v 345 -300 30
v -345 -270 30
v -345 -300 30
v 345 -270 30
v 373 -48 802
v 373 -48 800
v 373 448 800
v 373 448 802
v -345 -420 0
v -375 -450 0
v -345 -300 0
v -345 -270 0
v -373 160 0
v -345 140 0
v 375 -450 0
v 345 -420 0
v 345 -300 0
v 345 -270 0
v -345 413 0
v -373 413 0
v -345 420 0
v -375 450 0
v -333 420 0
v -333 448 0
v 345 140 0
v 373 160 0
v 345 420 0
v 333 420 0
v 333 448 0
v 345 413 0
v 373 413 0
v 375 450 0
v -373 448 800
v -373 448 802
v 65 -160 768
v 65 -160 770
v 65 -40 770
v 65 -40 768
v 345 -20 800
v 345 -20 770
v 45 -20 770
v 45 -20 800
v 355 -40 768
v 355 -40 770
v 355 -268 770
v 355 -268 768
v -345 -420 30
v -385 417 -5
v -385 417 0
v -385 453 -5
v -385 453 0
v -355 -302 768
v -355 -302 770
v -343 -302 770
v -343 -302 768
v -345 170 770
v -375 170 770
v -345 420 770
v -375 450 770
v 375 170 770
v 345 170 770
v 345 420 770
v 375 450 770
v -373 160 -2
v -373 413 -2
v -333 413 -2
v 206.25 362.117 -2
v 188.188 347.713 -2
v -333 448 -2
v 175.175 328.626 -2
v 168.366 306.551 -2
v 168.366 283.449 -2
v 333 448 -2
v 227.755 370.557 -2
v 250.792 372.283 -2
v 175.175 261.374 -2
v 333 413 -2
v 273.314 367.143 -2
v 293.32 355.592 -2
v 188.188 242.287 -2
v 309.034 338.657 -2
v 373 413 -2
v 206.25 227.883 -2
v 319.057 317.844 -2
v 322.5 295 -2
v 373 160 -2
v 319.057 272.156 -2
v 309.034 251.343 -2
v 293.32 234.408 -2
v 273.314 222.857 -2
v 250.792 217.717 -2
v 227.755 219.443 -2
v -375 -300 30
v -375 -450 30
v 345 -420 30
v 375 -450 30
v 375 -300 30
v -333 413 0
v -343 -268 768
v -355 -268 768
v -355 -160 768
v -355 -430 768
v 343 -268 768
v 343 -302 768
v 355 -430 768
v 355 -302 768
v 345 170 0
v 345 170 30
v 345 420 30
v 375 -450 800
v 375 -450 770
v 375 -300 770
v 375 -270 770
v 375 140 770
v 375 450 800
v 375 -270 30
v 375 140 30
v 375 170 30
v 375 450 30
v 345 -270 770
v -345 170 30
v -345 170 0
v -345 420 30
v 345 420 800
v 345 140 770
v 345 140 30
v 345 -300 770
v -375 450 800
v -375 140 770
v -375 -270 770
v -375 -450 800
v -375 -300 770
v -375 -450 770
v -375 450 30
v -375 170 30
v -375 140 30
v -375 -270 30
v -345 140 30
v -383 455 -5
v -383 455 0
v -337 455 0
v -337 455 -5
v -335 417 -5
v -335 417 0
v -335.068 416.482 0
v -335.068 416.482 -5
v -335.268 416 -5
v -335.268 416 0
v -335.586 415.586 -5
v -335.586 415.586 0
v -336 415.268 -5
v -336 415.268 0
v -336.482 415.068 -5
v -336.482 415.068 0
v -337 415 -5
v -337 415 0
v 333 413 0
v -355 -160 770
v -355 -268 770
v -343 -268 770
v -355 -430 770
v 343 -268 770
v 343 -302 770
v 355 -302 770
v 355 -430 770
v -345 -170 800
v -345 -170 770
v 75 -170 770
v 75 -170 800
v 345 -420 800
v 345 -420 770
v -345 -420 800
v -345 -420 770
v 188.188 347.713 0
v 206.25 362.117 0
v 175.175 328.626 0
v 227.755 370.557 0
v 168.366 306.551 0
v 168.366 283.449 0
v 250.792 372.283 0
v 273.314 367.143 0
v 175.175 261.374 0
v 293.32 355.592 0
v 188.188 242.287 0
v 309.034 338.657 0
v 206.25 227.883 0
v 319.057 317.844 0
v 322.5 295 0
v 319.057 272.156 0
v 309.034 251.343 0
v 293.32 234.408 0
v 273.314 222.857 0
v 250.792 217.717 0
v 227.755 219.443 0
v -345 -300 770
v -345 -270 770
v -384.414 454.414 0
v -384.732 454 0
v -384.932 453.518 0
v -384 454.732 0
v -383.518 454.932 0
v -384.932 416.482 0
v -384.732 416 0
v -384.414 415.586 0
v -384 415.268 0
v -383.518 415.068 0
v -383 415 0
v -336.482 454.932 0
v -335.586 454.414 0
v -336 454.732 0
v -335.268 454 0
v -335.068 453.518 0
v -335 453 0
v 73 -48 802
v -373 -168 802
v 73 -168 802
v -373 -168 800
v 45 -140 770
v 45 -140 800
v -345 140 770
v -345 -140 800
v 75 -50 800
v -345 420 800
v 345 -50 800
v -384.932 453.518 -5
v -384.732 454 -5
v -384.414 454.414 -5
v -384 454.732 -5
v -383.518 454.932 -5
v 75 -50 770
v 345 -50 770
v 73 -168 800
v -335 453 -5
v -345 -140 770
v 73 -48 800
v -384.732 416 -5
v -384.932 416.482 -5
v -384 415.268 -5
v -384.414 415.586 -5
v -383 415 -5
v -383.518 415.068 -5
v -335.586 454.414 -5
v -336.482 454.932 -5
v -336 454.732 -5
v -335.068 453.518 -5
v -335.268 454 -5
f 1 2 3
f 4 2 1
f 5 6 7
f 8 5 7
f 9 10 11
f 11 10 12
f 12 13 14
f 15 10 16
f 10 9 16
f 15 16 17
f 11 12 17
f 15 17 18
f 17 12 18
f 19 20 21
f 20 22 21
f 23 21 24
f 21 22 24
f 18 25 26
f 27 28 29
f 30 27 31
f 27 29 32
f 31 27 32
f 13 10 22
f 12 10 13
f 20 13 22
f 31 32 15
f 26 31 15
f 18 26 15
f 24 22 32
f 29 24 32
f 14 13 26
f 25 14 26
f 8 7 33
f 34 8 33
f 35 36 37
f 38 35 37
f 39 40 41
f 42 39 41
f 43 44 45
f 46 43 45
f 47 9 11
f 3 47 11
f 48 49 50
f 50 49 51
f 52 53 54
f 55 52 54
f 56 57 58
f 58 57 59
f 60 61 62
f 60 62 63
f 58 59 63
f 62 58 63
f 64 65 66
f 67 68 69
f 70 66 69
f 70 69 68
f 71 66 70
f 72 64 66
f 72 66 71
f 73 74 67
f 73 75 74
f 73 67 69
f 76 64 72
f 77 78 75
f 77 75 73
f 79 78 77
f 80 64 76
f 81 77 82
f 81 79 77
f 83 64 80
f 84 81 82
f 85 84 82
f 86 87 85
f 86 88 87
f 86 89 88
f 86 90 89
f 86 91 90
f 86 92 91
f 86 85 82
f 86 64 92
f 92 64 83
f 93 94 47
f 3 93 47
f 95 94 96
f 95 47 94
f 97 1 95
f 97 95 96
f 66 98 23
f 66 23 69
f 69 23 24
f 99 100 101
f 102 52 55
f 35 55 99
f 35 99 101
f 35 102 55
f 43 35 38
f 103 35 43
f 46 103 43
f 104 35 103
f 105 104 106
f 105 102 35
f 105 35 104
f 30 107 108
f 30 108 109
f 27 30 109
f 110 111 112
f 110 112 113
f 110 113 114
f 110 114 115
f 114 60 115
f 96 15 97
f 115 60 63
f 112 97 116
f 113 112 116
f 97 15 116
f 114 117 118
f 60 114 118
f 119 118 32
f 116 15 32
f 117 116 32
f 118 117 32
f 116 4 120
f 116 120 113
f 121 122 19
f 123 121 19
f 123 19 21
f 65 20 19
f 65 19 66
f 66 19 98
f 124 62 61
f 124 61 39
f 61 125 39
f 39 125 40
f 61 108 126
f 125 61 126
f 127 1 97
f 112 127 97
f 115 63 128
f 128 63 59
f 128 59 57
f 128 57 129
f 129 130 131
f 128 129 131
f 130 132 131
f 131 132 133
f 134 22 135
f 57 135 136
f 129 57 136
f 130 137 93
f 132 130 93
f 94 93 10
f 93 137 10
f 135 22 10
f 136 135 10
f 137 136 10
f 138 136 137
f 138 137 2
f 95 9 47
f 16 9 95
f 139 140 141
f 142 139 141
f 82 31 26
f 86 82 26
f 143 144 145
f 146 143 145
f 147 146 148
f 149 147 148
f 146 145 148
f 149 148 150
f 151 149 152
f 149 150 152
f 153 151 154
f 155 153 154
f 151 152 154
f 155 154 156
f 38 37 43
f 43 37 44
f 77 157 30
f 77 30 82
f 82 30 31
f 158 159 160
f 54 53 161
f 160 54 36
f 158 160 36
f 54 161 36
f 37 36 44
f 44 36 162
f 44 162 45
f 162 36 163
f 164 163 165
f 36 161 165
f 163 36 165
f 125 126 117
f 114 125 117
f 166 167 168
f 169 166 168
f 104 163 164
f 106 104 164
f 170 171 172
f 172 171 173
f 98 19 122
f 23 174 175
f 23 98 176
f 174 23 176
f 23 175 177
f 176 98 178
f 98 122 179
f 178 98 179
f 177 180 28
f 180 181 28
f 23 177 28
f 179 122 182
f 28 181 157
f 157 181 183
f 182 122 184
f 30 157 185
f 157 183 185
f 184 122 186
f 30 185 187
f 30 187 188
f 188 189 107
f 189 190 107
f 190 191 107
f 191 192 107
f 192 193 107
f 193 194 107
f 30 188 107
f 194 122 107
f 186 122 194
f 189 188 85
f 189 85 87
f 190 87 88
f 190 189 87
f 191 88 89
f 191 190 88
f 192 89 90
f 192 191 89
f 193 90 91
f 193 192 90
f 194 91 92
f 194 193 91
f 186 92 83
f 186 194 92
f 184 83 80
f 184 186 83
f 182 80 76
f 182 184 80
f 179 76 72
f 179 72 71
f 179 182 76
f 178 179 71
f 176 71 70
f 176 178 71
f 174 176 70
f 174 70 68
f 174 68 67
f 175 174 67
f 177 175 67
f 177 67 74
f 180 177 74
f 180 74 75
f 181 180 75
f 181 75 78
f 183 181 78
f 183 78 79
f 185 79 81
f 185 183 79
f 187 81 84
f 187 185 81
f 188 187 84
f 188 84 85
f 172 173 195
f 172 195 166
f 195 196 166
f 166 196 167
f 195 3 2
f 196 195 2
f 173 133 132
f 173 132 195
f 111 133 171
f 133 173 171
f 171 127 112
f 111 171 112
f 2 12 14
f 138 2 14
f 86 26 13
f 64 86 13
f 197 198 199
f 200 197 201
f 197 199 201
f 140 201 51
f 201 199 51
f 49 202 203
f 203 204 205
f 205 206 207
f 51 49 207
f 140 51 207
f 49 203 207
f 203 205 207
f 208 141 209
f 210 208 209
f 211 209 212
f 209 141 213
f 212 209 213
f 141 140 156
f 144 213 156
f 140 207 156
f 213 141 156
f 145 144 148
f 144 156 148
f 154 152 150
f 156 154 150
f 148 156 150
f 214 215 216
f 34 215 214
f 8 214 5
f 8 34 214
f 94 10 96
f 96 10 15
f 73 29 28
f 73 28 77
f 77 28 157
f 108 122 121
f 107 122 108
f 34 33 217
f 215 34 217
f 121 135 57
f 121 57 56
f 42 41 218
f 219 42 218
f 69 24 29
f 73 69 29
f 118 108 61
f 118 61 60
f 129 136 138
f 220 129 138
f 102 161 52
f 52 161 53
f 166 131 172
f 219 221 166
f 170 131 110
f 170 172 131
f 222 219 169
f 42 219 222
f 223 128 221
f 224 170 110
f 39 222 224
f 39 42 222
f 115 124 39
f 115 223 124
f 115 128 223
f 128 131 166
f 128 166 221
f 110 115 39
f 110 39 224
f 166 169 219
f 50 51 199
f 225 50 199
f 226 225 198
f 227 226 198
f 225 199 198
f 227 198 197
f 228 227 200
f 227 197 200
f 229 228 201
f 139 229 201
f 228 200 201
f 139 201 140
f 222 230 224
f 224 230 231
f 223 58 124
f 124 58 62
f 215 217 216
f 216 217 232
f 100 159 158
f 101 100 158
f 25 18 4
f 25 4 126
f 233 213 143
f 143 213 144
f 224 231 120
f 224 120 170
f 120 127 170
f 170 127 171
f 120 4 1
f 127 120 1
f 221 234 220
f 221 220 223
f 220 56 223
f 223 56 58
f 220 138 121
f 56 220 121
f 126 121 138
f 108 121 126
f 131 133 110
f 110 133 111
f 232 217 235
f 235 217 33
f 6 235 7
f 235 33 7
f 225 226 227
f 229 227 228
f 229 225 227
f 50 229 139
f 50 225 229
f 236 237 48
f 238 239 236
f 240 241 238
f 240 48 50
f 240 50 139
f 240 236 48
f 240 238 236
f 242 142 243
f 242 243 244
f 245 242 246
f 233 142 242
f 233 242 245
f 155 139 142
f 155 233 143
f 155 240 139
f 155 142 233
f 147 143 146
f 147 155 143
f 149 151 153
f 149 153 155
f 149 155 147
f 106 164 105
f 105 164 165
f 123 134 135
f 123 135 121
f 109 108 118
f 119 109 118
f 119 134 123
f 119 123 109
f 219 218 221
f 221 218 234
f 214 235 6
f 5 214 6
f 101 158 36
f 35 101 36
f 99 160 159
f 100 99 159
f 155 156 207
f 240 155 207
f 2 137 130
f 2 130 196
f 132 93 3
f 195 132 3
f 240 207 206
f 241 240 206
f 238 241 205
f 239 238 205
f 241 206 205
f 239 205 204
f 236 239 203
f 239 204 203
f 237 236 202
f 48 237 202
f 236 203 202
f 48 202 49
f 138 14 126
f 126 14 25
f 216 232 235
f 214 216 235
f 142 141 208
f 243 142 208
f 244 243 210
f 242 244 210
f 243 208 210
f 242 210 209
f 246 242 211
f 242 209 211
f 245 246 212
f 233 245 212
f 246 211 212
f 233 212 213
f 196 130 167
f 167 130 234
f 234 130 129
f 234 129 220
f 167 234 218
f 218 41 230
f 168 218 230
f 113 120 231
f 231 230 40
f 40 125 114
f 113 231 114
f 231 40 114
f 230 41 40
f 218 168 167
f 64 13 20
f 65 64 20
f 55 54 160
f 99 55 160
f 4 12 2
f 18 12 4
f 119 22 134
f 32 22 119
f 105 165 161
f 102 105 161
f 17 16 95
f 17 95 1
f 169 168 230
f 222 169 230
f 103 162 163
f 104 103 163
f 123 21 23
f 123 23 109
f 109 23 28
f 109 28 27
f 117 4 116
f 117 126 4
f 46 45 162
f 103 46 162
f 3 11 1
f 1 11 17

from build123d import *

# Parameters (mm, degrees)
F0_W      = 750
F0_H      = 900
F0_W_2    = 690
F0_H_2    = 120
F0_H_3    = 410
F0_H_4    = 250
F1_DEPTH  = 30
F2_W      = 30
F2_H      = 30
F3_DEPTH  = 740
F5_DEPTH  = 5
F6_W      = 30
F6_H      = 30
F7_DEPTH  = 30
F9_DEPTH  = 2
F10_R     = 77.5
F11_DEPTH = 2
F13_DEPTH = 2


with BuildPart() as f1:
    # F0 (on Top) → F1 (new body)
    with BuildSketch(Plane.XY):
        Rectangle(F0_W, F0_H)
        with Locations((0, -360)):
            Rectangle(F0_W_2, F0_H_2, mode=Mode.SUBTRACT)
        with Locations((0, -65)):
            Rectangle(F0_W_2, F0_H_3, mode=Mode.SUBTRACT)
        with Locations((0, 295)):
            Rectangle(F0_W_2, F0_H_4, mode=Mode.SUBTRACT)
    extrude(amount=F1_DEPTH)

    # F2 (on face) → F3 (join)
    with BuildSketch(Plane.XY.offset(30)):
        with Locations((-360, -285)):
            Rectangle(F2_W, F2_H)
        with Locations((360, -285)):
            Rectangle(F2_W, F2_H)
        with Locations((360, 155)):
            Rectangle(F2_W, F2_H)
        with Locations((-360, 155)):
            Rectangle(F2_W, F2_H)
    extrude(amount=F3_DEPTH)

    # F6 (on face) → F7 (join)
    with BuildSketch(Plane.XY.offset(770)):
        Polygon((375, 170), (375, 450), (-375, 450), (-375, -450), (375, -450), (375, 140), (345, 140), (345, -20), (45, -20), (45, -140), (-345, -140), (-345, 420), (345, 420), (345, 170), align=None)
        Polygon((345, -50), (345, -420), (-345, -420), (-345, -170), (75, -170), (75, -50), align=None, mode=Mode.SUBTRACT)
        with Locations((360, 155)):
            Rectangle(F6_W, F6_H)
    extrude(amount=F7_DEPTH)

    # F10 (on face) → F11 (join)
    with BuildSketch(Plane(origin=(0, 0, 0), x_dir=(1, 0, 0), z_dir=(0, 0, -1))):
        Polygon((-373, -413), (-345, -413), (-345, -170), (345, -170), (345, -413), (373, -413), (373, -160), (0, -160), (-373, -160), align=None)
        Polygon((-333, -413), (-333, -420), (333, -420), (333, -413), (345, -413), (345, -170), (-345, -170), (-345, -413), align=None)
        with Locations((245, -295)):
            Circle(F10_R, mode=Mode.SUBTRACT)
        Polygon((-333, -448), (0, -448), (333, -448), (333, -420), (-333, -420), align=None)
    extrude(amount=F11_DEPTH)


with BuildPart() as f5:
    # F4 (on face) → F5 (new body)
    with BuildSketch(Plane(origin=(0, 0, 0), x_dir=(1, 0, 0), z_dir=(0, 0, -1))):
        Polygon((-345, -415), (-375, -415), (-375, -450), (-335, -450), (-335, -420), (-345, -420), align=None)
        with BuildLine():
            Line((-375, -415), (-383, -415))
            ThreePointArc((-383, -415), (-384.4142135624, -415.5857864376), (-385, -417))
            Line((-385, -417), (-385, -453))
            ThreePointArc((-385, -453), (-384.4142135624, -454.4142135624), (-383, -455))
            Line((-383, -455), (-337, -455))
            ThreePointArc((-337, -455), (-335.5857864376, -454.4142135624), (-335, -453))
            Line((-335, -453), (-335, -450))
            Line((-335, -450), (-375, -450))
            Line((-375, -450), (-375, -415))
        make_face()
        with BuildLine():
            Line((-337, -415), (-345, -415))
            Line((-345, -415), (-345, -420))
            Line((-345, -420), (-335, -420))
            Line((-335, -420), (-335, -417))
            ThreePointArc((-335, -417), (-335.5857864376, -415.5857864376), (-337, -415))
        make_face()
    extrude(amount=F5_DEPTH)


with BuildPart() as f9:
    # F8 (on face) → F9 (new body)
    with BuildSketch(Plane.XY.offset(800)):
        Polygon((373, 448), (-373, 448), (-373, -168), (73, -168), (73, -48), (373, -48), align=None)
        Polygon((345, 420), (345, -20), (45, -20), (45, -140), (-345, -140), (-345, 420), align=None, mode=Mode.SUBTRACT)
        Polygon((45, -20), (345, -20), (345, 420), (-345, 420), (-345, -140), (45, -140), align=None)
    extrude(amount=F9_DEPTH)


with BuildPart() as f13:
    # F12 (on face) → F13 (new body)
    with BuildSketch(Plane(origin=(0, 0, 770), x_dir=(1, 0, 0), z_dir=(0, 0, -1))):
        Polygon((355, 302), (355, 430), (-355, 430), (-355, 302), (-343, 302), (-343, 268), (-355, 268), (-355, 160), (65, 160), (65, 40), (355, 40), (355, 268), (343, 268), (343, 302), align=None)
    extrude(amount=F13_DEPTH)


solid = Compound([f1.part, f5.part, f9.part, f13.part])
